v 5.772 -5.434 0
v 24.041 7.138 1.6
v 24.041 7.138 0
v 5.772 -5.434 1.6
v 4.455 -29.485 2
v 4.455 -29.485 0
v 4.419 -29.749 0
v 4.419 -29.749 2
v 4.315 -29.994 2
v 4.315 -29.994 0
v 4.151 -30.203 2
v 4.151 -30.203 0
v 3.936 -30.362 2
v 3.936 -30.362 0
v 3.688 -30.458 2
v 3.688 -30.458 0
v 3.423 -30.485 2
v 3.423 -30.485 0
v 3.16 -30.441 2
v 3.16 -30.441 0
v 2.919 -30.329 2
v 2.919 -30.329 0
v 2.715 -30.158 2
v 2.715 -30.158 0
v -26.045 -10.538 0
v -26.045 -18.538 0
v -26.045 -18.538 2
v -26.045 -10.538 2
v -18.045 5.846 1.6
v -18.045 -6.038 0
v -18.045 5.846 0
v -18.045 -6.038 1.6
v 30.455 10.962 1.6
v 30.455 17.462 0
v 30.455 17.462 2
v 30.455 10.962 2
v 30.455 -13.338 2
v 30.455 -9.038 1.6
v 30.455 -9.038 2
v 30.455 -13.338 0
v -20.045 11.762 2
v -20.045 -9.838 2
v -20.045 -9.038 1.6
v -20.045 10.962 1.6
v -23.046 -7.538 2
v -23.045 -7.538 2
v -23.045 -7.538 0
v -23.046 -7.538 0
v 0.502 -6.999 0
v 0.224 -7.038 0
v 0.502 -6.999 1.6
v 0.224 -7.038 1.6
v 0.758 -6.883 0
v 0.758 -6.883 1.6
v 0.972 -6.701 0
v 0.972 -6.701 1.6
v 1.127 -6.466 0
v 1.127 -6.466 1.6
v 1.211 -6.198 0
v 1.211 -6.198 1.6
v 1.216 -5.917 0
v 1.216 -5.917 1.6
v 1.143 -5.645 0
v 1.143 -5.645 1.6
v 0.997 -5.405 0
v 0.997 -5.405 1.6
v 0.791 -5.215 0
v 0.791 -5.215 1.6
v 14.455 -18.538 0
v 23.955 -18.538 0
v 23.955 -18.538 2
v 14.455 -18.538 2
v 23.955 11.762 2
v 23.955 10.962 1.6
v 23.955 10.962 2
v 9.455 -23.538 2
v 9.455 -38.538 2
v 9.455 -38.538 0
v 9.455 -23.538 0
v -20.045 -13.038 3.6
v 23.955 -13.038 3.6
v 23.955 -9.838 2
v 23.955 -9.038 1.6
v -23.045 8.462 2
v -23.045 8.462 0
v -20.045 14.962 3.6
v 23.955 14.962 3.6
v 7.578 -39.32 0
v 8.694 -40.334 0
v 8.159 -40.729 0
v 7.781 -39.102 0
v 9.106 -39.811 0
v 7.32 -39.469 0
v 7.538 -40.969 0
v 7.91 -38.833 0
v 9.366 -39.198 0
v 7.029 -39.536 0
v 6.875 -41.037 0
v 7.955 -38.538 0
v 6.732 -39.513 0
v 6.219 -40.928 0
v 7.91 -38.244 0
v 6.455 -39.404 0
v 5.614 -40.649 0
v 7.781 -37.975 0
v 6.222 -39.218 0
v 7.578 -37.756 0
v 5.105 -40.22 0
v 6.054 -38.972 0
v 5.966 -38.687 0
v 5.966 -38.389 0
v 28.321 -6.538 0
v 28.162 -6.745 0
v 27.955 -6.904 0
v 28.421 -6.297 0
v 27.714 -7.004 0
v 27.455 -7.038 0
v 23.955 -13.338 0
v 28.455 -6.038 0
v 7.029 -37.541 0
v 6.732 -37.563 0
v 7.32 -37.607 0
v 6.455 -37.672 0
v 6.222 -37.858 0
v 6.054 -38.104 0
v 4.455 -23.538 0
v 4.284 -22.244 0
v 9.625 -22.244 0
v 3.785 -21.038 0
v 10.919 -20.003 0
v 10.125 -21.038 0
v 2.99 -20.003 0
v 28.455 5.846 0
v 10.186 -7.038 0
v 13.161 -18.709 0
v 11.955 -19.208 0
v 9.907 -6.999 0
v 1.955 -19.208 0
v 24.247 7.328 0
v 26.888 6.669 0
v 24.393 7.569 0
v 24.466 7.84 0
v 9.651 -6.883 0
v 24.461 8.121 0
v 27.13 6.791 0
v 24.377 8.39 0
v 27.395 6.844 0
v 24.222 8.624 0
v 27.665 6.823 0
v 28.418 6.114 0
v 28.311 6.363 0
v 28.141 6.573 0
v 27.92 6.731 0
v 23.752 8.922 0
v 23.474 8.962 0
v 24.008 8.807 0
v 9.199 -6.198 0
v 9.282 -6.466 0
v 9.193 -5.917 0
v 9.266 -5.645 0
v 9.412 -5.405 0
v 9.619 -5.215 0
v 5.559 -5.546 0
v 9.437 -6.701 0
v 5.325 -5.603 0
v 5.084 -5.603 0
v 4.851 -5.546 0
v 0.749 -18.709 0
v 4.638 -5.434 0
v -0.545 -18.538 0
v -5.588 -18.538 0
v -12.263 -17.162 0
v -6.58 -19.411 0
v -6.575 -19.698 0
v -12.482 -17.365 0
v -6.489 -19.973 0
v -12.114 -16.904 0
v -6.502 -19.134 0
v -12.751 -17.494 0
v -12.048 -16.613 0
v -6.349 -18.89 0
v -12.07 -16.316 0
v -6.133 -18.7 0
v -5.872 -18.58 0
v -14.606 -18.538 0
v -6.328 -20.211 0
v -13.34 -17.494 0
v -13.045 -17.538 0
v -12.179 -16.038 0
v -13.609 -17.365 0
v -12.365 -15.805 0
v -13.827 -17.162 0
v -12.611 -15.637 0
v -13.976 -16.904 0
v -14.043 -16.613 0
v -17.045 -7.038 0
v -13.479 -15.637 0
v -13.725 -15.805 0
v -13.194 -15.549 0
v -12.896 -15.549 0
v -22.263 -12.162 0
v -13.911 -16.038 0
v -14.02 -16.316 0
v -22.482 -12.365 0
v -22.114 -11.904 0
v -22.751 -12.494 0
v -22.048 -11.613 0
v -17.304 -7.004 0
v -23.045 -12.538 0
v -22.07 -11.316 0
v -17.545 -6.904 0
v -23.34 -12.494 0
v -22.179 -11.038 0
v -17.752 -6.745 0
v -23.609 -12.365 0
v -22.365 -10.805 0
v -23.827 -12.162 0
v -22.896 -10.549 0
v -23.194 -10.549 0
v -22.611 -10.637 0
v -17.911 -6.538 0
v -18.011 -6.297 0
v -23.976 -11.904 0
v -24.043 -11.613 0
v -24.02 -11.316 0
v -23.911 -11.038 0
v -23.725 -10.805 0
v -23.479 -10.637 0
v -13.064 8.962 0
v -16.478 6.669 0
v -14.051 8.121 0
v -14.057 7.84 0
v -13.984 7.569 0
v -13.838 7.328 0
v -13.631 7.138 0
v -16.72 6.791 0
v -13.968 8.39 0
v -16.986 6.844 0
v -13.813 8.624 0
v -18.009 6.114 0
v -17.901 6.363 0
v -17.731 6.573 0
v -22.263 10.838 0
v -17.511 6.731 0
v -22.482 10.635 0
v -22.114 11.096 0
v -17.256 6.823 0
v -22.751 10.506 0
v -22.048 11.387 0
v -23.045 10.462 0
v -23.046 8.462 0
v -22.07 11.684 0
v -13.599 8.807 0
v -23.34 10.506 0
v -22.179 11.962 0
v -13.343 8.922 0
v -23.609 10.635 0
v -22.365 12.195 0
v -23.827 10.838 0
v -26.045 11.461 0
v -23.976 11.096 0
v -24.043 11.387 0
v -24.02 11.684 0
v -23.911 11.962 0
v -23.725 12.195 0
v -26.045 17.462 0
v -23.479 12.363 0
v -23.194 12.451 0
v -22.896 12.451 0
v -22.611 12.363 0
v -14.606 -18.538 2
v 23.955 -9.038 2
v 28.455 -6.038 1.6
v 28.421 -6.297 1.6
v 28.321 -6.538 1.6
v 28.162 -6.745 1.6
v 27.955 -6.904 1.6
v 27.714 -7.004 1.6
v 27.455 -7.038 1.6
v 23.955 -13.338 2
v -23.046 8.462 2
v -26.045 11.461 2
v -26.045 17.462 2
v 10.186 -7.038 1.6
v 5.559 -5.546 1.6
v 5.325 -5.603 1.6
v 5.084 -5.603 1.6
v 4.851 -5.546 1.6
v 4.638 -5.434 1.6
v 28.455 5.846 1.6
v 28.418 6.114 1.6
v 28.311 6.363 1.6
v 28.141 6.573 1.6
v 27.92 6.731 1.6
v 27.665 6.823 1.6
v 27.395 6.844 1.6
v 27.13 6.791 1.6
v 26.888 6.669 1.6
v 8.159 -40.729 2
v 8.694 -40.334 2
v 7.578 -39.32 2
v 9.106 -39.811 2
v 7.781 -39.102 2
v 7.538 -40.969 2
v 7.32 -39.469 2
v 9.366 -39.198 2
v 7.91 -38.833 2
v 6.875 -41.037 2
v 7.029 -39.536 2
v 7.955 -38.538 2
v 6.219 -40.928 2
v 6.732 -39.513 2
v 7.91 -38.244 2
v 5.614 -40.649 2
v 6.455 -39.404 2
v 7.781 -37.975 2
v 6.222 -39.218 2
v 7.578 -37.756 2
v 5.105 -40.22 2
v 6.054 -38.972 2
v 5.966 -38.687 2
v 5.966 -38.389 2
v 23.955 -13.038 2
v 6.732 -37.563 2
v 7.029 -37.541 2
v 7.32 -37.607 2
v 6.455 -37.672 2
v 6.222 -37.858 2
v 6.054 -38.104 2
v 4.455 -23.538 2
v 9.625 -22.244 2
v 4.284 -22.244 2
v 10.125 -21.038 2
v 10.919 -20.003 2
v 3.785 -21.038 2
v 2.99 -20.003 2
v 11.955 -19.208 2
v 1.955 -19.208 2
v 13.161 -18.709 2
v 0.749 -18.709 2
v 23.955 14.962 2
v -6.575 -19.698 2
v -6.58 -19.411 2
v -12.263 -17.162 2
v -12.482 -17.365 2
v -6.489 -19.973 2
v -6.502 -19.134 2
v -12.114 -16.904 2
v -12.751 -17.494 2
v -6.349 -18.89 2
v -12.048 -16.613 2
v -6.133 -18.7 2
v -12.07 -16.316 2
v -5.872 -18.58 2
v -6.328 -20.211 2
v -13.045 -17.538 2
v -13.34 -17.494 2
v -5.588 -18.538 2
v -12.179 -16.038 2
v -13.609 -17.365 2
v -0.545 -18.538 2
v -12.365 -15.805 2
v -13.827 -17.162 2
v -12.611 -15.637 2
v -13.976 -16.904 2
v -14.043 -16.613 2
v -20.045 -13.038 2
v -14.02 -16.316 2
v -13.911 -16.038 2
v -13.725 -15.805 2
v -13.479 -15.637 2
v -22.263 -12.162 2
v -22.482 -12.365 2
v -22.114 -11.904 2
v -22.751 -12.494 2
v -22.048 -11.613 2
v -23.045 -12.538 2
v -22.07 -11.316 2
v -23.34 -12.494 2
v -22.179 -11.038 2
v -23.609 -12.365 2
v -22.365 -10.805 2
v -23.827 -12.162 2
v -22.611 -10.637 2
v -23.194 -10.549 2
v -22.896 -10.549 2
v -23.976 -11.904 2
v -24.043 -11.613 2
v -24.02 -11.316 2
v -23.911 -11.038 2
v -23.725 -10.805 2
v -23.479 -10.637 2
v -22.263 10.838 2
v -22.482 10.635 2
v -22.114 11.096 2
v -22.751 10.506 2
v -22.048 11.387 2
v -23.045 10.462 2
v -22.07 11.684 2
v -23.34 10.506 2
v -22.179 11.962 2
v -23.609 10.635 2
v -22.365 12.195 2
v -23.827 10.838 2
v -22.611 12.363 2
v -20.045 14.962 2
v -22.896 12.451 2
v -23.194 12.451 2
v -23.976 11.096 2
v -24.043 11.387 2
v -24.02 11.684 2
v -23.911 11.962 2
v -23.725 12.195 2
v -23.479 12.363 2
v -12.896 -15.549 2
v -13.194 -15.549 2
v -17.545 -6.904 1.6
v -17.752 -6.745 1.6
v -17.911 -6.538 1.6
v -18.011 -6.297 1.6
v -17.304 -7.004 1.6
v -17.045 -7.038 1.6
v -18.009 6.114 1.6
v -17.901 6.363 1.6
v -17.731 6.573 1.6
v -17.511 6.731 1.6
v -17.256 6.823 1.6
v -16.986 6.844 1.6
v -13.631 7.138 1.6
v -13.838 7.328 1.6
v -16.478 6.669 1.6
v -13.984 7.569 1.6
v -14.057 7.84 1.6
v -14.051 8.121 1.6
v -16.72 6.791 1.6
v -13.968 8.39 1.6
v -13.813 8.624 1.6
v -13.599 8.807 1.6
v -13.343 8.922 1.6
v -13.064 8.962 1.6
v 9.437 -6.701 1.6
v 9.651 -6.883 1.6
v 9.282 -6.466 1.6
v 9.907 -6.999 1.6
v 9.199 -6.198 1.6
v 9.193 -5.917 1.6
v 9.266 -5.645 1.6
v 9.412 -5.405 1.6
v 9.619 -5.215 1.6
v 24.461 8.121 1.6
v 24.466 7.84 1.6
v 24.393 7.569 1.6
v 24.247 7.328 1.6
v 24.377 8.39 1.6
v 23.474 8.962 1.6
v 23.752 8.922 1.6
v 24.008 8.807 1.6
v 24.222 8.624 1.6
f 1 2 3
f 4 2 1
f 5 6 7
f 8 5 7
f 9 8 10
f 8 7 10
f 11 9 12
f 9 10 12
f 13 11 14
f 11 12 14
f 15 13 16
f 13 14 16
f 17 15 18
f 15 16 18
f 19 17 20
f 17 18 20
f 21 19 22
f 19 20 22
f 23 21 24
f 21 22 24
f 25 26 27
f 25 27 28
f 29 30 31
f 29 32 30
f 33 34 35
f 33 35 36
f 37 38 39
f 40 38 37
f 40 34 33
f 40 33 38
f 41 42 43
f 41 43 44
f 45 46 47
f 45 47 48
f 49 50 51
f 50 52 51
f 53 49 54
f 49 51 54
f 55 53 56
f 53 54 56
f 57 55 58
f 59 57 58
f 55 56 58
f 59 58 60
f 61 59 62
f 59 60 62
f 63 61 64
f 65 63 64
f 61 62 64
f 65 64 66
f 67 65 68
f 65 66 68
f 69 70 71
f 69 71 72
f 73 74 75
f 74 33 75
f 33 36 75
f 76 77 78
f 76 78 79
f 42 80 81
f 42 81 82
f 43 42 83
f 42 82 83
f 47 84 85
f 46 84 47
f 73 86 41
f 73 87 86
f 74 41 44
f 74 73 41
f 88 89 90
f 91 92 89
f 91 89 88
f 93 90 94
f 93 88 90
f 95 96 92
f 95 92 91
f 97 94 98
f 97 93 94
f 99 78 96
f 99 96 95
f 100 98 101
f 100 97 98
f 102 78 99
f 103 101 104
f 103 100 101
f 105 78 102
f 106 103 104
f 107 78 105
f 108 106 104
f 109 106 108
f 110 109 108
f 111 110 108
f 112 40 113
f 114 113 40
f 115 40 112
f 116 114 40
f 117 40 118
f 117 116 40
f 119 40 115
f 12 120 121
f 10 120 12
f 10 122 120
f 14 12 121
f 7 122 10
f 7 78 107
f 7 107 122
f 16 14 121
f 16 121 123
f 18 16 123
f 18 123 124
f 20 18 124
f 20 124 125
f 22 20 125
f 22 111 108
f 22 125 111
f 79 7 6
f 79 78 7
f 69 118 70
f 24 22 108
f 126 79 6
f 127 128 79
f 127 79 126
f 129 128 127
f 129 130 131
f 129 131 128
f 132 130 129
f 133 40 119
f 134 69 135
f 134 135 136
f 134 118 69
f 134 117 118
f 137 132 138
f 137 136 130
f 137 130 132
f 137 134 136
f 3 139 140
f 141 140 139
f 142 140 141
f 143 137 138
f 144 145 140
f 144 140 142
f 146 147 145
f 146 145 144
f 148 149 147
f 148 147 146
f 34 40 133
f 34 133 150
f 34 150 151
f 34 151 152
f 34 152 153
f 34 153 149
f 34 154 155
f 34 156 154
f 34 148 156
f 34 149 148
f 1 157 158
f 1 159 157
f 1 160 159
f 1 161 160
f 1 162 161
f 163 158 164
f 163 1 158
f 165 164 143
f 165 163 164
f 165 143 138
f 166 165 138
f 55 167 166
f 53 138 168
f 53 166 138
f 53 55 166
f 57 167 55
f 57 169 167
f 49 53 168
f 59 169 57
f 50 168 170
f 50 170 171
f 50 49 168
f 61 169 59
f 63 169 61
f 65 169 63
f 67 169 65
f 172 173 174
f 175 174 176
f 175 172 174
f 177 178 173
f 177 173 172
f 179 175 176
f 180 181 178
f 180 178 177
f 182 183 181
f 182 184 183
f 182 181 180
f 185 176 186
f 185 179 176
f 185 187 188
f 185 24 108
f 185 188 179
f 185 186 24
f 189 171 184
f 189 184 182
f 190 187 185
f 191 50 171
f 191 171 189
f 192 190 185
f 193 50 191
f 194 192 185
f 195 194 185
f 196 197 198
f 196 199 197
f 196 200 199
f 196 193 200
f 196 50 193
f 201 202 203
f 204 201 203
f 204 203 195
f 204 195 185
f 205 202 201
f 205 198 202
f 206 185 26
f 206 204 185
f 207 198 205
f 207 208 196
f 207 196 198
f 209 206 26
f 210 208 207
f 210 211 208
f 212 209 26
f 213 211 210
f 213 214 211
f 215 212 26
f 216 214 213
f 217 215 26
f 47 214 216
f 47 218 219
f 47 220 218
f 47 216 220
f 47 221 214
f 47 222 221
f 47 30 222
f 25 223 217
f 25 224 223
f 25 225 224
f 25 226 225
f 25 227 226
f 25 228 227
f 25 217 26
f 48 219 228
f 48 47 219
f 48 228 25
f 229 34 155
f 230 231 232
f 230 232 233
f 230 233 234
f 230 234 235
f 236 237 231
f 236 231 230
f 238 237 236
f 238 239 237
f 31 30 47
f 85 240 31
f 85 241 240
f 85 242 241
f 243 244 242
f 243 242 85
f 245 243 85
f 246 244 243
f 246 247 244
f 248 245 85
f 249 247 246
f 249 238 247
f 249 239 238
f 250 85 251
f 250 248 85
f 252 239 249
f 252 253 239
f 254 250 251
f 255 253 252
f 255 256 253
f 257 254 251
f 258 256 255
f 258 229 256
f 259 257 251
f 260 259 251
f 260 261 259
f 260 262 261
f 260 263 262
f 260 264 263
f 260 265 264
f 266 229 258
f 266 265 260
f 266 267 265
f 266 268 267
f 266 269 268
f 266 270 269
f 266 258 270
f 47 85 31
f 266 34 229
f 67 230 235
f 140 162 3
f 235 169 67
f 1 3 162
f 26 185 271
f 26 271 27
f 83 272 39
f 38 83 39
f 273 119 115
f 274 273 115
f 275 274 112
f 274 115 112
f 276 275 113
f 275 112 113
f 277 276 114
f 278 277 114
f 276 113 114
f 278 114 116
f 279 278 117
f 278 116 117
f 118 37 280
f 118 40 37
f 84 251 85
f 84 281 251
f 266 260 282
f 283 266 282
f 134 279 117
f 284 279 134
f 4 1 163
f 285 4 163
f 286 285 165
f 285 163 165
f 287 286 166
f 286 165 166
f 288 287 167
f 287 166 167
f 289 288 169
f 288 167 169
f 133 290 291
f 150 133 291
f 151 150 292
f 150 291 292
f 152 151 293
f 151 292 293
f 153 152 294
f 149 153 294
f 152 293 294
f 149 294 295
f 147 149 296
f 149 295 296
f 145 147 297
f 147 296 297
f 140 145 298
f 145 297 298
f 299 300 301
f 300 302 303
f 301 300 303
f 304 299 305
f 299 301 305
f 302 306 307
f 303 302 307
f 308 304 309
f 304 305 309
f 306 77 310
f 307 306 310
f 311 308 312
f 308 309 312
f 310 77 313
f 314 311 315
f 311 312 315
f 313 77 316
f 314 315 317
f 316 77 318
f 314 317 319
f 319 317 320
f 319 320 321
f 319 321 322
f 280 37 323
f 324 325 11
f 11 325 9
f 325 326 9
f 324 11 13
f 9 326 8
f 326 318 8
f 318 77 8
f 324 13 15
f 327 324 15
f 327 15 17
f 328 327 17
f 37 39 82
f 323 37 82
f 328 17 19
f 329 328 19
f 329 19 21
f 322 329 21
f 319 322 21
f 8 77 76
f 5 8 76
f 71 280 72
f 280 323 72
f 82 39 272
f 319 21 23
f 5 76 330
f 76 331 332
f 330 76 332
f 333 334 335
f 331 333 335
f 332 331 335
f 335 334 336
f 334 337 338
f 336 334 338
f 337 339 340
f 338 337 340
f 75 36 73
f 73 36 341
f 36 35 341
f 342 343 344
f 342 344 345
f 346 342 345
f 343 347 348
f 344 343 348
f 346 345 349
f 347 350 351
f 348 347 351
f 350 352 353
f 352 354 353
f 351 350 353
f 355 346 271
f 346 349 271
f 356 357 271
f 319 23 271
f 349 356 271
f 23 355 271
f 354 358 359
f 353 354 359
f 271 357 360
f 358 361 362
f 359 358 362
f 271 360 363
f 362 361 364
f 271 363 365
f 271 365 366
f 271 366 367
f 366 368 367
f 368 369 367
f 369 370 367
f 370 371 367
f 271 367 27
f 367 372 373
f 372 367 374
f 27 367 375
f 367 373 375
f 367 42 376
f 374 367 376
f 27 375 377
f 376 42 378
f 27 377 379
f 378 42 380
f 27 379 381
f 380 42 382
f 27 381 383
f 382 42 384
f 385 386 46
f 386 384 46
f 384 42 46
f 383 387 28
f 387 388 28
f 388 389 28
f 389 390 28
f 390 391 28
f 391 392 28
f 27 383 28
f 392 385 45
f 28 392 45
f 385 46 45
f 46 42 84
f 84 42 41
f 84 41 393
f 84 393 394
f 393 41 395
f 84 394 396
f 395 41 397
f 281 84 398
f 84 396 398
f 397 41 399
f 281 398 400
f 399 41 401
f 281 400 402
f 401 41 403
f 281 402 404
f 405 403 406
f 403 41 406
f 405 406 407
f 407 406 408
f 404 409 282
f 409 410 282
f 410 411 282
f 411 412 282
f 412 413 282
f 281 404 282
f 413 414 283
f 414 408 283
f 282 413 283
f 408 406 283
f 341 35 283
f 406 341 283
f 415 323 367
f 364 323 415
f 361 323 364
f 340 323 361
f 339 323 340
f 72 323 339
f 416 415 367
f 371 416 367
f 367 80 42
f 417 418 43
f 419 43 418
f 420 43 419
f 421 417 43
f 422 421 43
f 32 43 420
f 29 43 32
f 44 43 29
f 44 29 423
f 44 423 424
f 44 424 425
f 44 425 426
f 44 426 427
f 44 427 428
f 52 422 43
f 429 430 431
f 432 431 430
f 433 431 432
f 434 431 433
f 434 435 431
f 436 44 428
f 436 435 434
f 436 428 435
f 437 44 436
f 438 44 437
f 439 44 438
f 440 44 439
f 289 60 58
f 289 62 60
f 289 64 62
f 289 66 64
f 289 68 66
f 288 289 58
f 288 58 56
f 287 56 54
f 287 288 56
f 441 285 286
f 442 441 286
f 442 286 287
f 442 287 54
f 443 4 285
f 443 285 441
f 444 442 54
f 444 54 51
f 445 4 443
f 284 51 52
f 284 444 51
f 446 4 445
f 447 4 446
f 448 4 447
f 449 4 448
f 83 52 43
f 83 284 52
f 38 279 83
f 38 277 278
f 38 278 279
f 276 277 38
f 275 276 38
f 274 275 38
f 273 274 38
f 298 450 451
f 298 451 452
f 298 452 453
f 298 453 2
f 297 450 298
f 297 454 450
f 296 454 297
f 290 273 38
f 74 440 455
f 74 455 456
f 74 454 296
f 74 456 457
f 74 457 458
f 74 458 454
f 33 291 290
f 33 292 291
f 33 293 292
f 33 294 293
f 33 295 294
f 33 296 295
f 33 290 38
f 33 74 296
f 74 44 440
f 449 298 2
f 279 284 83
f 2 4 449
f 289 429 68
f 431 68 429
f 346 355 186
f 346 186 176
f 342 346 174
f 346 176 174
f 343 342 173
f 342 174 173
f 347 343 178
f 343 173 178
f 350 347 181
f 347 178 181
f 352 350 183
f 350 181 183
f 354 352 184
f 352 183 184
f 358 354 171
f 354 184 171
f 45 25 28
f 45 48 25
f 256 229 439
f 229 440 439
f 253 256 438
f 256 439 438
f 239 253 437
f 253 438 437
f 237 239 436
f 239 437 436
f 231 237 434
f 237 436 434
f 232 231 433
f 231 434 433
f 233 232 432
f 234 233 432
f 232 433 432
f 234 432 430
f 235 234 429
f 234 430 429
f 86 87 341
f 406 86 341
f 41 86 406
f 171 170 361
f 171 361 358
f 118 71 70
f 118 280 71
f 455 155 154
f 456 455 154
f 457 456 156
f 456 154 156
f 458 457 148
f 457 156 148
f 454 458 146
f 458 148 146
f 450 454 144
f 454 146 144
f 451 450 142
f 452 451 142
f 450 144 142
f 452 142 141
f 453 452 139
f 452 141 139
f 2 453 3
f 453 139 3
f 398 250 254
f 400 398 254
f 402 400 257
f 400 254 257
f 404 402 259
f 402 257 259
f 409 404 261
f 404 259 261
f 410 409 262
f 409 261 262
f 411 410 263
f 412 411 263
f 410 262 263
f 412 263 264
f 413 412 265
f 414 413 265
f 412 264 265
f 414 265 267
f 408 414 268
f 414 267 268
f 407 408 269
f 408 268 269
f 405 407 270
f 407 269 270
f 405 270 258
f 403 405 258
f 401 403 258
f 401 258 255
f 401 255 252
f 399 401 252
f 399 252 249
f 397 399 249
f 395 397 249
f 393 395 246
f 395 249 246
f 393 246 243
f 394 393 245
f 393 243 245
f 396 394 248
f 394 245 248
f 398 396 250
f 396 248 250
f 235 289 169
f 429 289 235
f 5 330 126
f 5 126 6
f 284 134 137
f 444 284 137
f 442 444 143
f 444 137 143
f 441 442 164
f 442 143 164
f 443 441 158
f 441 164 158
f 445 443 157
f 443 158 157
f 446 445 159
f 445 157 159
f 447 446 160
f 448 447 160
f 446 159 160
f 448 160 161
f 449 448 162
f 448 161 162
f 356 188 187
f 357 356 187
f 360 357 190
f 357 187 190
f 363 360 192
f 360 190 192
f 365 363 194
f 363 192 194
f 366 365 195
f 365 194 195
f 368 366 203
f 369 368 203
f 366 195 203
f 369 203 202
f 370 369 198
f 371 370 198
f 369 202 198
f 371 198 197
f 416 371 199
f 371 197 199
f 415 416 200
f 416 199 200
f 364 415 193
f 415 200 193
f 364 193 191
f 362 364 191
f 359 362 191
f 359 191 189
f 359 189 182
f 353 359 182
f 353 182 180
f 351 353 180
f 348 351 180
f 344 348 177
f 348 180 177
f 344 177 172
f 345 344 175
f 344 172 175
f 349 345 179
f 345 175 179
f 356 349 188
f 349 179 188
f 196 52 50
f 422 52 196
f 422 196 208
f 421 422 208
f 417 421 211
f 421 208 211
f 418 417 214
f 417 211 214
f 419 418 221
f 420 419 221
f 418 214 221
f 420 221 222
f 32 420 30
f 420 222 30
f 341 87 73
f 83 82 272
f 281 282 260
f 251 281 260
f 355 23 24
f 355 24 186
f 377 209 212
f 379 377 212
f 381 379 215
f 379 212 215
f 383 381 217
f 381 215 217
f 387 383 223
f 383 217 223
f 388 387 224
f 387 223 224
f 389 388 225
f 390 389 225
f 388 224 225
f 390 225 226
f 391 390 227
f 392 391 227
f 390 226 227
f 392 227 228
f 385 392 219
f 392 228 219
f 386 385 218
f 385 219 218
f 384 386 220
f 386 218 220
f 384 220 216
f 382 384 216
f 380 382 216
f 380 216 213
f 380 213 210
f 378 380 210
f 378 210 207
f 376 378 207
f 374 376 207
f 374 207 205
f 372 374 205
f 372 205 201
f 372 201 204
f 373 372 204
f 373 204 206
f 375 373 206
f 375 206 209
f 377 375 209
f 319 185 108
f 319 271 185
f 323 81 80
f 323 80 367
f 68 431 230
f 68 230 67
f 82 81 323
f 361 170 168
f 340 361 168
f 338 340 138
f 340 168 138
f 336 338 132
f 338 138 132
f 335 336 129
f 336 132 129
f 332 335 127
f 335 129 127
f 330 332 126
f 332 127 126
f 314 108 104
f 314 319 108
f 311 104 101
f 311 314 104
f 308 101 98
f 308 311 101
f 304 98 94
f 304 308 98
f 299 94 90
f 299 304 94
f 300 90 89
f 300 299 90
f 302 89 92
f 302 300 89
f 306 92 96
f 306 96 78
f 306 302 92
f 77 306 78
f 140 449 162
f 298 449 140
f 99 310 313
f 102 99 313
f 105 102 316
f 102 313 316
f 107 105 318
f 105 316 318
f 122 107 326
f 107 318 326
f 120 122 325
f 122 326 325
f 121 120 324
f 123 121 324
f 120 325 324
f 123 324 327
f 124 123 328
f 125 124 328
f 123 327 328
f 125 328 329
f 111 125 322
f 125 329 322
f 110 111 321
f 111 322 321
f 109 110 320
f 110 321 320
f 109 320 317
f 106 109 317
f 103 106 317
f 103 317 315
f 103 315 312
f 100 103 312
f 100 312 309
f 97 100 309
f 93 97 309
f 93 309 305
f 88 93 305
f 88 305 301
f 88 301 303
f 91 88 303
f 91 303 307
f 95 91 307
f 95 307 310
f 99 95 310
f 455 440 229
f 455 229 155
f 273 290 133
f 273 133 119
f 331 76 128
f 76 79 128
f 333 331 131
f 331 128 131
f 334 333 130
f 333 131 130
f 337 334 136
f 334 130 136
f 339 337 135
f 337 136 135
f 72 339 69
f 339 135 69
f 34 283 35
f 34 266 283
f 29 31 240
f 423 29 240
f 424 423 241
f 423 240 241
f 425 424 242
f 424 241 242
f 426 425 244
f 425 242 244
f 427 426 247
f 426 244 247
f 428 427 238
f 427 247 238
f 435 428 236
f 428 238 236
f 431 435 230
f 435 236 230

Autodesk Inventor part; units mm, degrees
ref_plane "YZ Plane" through (0, 0, 0) normal (1, 0, 0) x (0, 1, 0)
ref_plane "XZ Plane" through (0, 0, 0) normal (0, 1, 0) x (-1, 0, 0)
ref_plane "XY Plane" through (0, 0, 0) normal (0, 0, 1) x (1, 0, 0)
sketch "Sketch1" plane through (0, 0, 0) normal (0, 0, 1) x (1, 0, 0)
  line L0 (-26.0453, 15.4617) -> (23.9547, 15.4617)
  line L1 (23.9547, 15.4617) -> (23.9547, -18.5383)
  line L2 (23.9547, -18.5383) -> (-26.0453, -18.5383)
  line L3 (-26.0453, -18.5383) -> (-26.0453, 15.4617)
  point P0 (0, 0)
  dimension "d0" = 50
  dimension "d1" = 34
extrude "Extrusion1" add sketch "Sketch1" along normal blind 2
sketch "Sketch2" plane through (0, 0, 2) normal (0, 0, 1) x (1, 0, 0)
  line L0 (-26.0453, 15.4617) -> (-26.0453, -18.5383) projected
  line L1 (23.9547, 15.4617) -> (-26.0453, 15.4617) projected
  point P0 (0, 0)
  point P1 (-23.0453, 11.4617)
  point P2 (-23.0453, -11.5383)
  point P3 (-13.0453, -16.5383)
  dimension "d4" = 23
  dimension "d5" = 3
  dimension "d6" = 3
  dimension "d7" = 4
  dimension "d8" = 5
  dimension "d9" = 10
hole "Hole1" at (-23.0453, 11.4617, 2) at (-23.0453, -11.5383, 2) at (-13.0453, -16.5383, 2) direction (0, 0, -1) diameter 2 depth 6.5 tip angle 118
sketch "Sketch3" plane through (0, 0, 2) normal (0, 0, 1) x (1, 0, 0)
  line L0 (-26.0453, 15.4617) -> (-26.0453, -18.5383) projected
  line L1 (-26.0453, 8.4617) -> (-23.0453, 8.4617)
  line L2 (-23.0453, 8.4617) -> (-23.0453, -7.5383)
  line L3 (-23.0453, -7.5383) -> (-26.0453, -7.5383)
  line L4 (-26.0453, -7.5383) -> (-26.0453, 8.4617)
  line L5 (23.9547, 15.4617) -> (-26.0453, 15.4617) projected
  circle A0 centre (-23.0453, -11.5383) radius 1 projected
  point P0 (0, 0)
  dimension "d17" = 7
  dimension "d18" = 4
  dimension "d19" = 3
extrude "Extrusion2" cut sketch "Sketch3" against normal blind 2 contours L1 L2 L3 L0
chamfer "Chamfer1" distance 3 angle 45 2 edges at (-26.0453, 8.4617, 1) (-26.0453, -7.5383, 1)
sketch "Sketch5" plane through (0, 0, 2) normal (0, 0, 1) x (1, 0, 0)
  line L0 (-20.0453, 14.9617) -> (23.9547, 14.9617)
  line L1 (23.9547, 14.9617) -> (23.9547, -13.0383)
  line L2 (23.9547, -13.0383) -> (-20.0453, -13.0383)
  line L3 (-20.0453, -13.0383) -> (-20.0453, 14.9617)
  line L4 (23.9547, 15.4617) -> (-26.0453, 15.4617) projected
  line L5 (-26.0453, -18.5383) -> (23.9547, -18.5383) projected
  line L6 (-23.0453, 8.4617) -> (-23.0453, -7.5383) projected
  line L7 (23.9547, -18.5383) -> (23.9547, 15.4617) projected
  circle A0 centre (-13.0453, -16.5383) radius 1 projected
  point P0 (0, 0)
  dimension "d27" = 3
  dimension "d28" = 0
  dimension "d29" = 50
  dimension "d30" = 3.5
  dimension "d31" = 31.5
  dimension "d32" = 0.5
extrude "Extrusion3" cut sketch "Sketch5" against normal blind 0.4 contours L0 L1 L2 L3
sketch "Sketch8" plane through (0, 0, 2) normal (0, 0, 1) x (1, 0, 0)
  line L0 (-26.0453, -18.5383) -> (23.9547, -18.5383) projected
  line L1 (11.9547, -18.5383) -> (-1.0453, -18.5383)
  line L2 (-1.0453, -18.5383) -> (-1.0453, -44.5383)
  line L3 (-1.0453, -44.5383) -> (11.9547, -44.5383)
  line L4 (11.9547, -44.5383) -> (11.9547, -18.5383)
  line L5 (23.9547, -18.5383) -> (23.9547, 15.4617) projected
  circle A0 centre (-13.0453, -16.5383) radius 1 projected
  line L6 (6.9547, -38.5383) -> (6.9547, -18.5383) construction
  line L7 (9.4547, -38.5383) -> (9.4547, -18.5383)
  line L8 (4.4547, -18.5383) -> (4.4547, -38.5383)
  arc A1 (4.4547, -38.5383) -> (9.4547, -38.5383) centre (6.9547, -38.5383) ccw
  arc A2 (9.4547, -18.5383) -> (4.4547, -18.5383) centre (6.9547, -18.5383) ccw
  circle A3 centre (6.9547, -38.5383) radius 1
  point P0 (0, 0)
  point P1 (23.9547, -13.0383)
  point P2 (6.9547, -28.5383)
  dimension "d48" = 12
  dimension "d49" = 25
  dimension "d50" = 20
  dimension "d51" = 22
  dimension "d52" = 6
  dimension "d53" = 5
  dimension "d54" = 2
extrude "Extrusion6" add sketch "Sketch8" against normal blind 2 contours L0 L7 A1 L8
fillet "Fillet1" radius 5 2 edges at (4.4547, -18.5383, 1) (9.4547, -18.5383, 1)
sketch "Sketch9" plane through (0, 0, 2) normal (0, 0, 1) x (1, 0, 0)
  circle A0 centre (-13.0453, -16.5383) radius 1 projected
  circle A1 centre (6.9547, -38.5383) radius 1 projected
  line L0 (-13.0453, -16.5383) -> (6.9547, -38.5383) construction
  line L1 (-14.8951, -18.22) -> (5.1049, -40.22)
  line L2 (8.8046, -36.8566) -> (-11.1954, -14.8566)
  arc A2 (-11.1954, -14.8566) -> (-14.8951, -18.22) centre (-13.0453, -16.5383) ccw
  arc A3 (5.1049, -40.22) -> (8.8046, -36.8566) centre (6.9547, -38.5383) ccw
  line L3 (-26.0453, -18.5383) -> (-0.5453, -18.5383) projected
  line L4 (-14.6058, -18.5383) -> (-7.8485, -18.5383)
  line L5 (4.4547, -23.5383) -> (4.4547, -38.5383) projected
  line L6 (4.4547, -32.0718) -> (4.4547, -38.5383)
  line L7 (4.4547, -38.5383) -> (6.7171, -41.027)
  arc A4 (4.4547, -38.5383) -> (9.4547, -38.5383) centre (6.9547, -38.5383) ccw projected
  point P0 (0, 0)
  point P1 (-3.0453, -27.5383)
extrude "Extrusion7" add sketch "Sketch9" against normal blind 2 contours L3 L2 L5 A4 L1
fillet "Fillet2" radius 1 2 edges at (-7.8485, -18.5383, 1) (4.4547, -32.0718, 1)
sketch "Sketch10" plane through (-26.0453, 15.4617, 0) normal (0, 1, 0) x (1, 0, 0)
  line L0 (50, 0) -> (50, -2) projected
  line L1 (0, 0) -> (0, -2) projected
  line L2 (50, -2) -> (0, -2)
  line L3 (0, -2) -> (0, 0)
  line L4 (0, 0) -> (50, 0)
  line L5 (50, 0) -> (50, -2)
  point P0 (26.0453, 0)
extrude "Extrusion8" add sketch "Sketch10" along normal blind 2
sketch "Sketch13" plane through (23.9547, -18.5383, 2) normal (1, 0, 0) x (0, 0, -1)
  line L0 (0, 0) -> (0, 5.5) projected
  line L1 (0.4, 5.5) -> (0.4, 33.5) projected
  line L2 (0.4, 5.5) -> (0, 5.5) projected
  line L3 (-1.6, 5.5) -> (0.4, 9.5)
  line L4 (0, 5.5) -> (0.4, 5.5) projected
  line L5 (-1.6, 5.5) -> (0.4, 5.5)
  line L6 (0.4, 5.5) -> (0.4, 9.5)
  point P0 (2, 18.5383)
  point P1 (0.4, 30.4)
  dimension "d70" = 1.6
  dimension "d71" = 4
extrude "Extrusion11" add sketch "Sketch13" against normal blind 44
sketch "Sketch14" plane through (23.9547, -18.5383, 2) normal (1, 0, 0) x (0, 0, -1)
  line L0 (0, 33.5) -> (0, 36) projected
  line L1 (0.4, 33.5) -> (0.4, 9.5) projected
  line L2 (0, 33.5) -> (0.4, 33.5) projected
  line L3 (-1.6, 33.5) -> (0.4, 29.5)
  line L4 (-1.6, 33.5) -> (0.4, 33.5)
  line L5 (0.4, 29.5) -> (0.4, 33.5)
  point P0 (2, 18.5383)
  dimension "d74" = 1.6
  dimension "d75" = 4
extrude "Extrusion12" add sketch "Sketch14" against normal blind 44
sketch "Sketch15" plane through (0, 0, 0) normal (0, 0, -1) x (-1, 0, 0)
  line L0 (-23.9547, -18.5383) -> (-23.9547, 17.4617) projected
  line L1 (-23.9547, 17.4617) -> (-30.4547, 17.4617)
  line L2 (-30.4547, 17.4617) -> (-30.4547, -13.3383)
  line L3 (-30.4547, -13.3383) -> (-23.9547, -13.3383)
  line L4 (-23.9547, -13.3383) -> (-23.9547, 17.4617)
  line L5 (-14.4547, -18.5383) -> (-23.9547, -18.5383) projected
  point P0 (0, 0)
  dimension "d78" = 5.2
  dimension "d79" = 6.5
extrude "Extrusion13" add sketch "Sketch15" against normal blind 2
sketch "Sketch16" plane through (0, 0, 2) normal (0, 0, 1) x (1, 0, 0)
  line L0 (30.4547, -13.3383) -> (30.4547, 17.4617) projected
  line L1 (-20.0453, -9.0383) -> (23.9547, -9.0383) projected
  line L2 (30.4547, 10.9617) -> (-20.0453, 10.9617)
  line L3 (-20.0453, 10.9617) -> (-20.0453, -9.0383)
  line L4 (-20.0453, -9.0383) -> (30.4547, -9.0383)
  line L5 (30.4547, -9.0383) -> (30.4547, 10.9617)
  line L6 (23.9547, 10.9617) -> (-20.0453, 10.9617) projected
  point P0 (0, 0)
  point P1 (30.4547, -9.0383)
extrude "Extrusion14" cut sketch "Sketch16" against normal blind 0.4
sketch "Sketch17" plane through (0, 0, 1.6) normal (0, 0, 1) x (1, 0, 0)
  line L0 (28.4547, -7.0383) -> (-18.0453, -7.0383)
  line L1 (-18.0453, -7.0383) -> (-18.0453, 8.9617)
  line L2 (-18.0453, 8.9617) -> (28.4547, 8.9617)
  line L3 (28.4547, 8.9617) -> (28.4547, -7.0383)
  line L4 (30.4547, -9.0383) -> (23.9547, -9.0383) projected
  line L5 (23.9547, 10.9617) -> (30.4547, 10.9617) projected
  line L6 (30.4547, 10.9617) -> (30.4547, -9.0383) projected
  line L7 (-20.0453, -9.8383) -> (-20.0453, 11.7617) projected
  point P0 (0, 0)
  dimension "d84" = 2
  dimension "d85" = 2
  dimension "d86" = 2
  dimension "d87" = 2
extrude "Extrusion15" cut sketch "Sketch17" against normal blind 2
sketch "Sketch18" plane through (0, 0, 1.6) normal (0, 0, 1) x (1, 0, 0)
  line L0 (-18.0453, -7.0383) -> (28.4547, -7.0383) projected
  line L1 (28.4547, 8.9617) -> (-18.0453, 8.9617) projected
  line L2 (5.2047, -7.0383) -> (28.4547, 8.9617) construction
  line L3 (5.7716, -7.8621) -> (29.0216, 8.1379)
  line L4 (27.8878, 9.7855) -> (4.6378, -6.2145)
  arc A0 (4.6378, -6.2145) -> (5.7716, -7.8621) centre (5.2047, -7.0383) ccw
  arc A1 (29.0216, 8.1379) -> (27.8878, 9.7855) centre (28.4547, 8.9617) ccw
  line L5 (5.2047, -7.0383) -> (-18.0453, 8.9617) construction
  line L6 (5.7716, -6.2145) -> (-17.4784, 9.7855)
  line L7 (-18.6122, 8.1379) -> (4.6378, -7.8621)
  arc A2 (4.6378, -7.8621) -> (5.7716, -6.2145) centre (5.2047, -7.0383) ccw
  arc A3 (-17.4784, 9.7855) -> (-18.6122, 8.1379) centre (-18.0453, 8.9617) ccw
  point P0 (0, 0)
  point P1 (16.5637, 8.9617)
  point P2 (-8.738, 9.9617)
  point P3 (16.8297, 0.9617)
  point P4 (-6.4203, 0.9617)
  point P5 (4.6378, -7.8621)
  point P6 (5.2047, -5.8244)
  dimension "d90" = 46.5
  dimension "d91" = 2
  dimension "d92" = 2
extrude "Extrusion16" add sketch "Sketch18" against normal blind 1.6 contours L7 A3 L6 L4 A0 L0 | L0 A0 L7 | A0 L4 L6 A2 L0 | L0 A2 A0 | A2 L6 L4 A1 L3 L0 | L0 L3 A2
fillet "Fillet3" radius 1 9 edges at (28.4547, -7.0383, 0.8) (28.4547, 7.7478, 0.8) (26.6907, 8.9617, 0.8) (6.9687, -7.0383, 0.8) (5.2047, -5.8244, 0.8) (3.4407, -7.0383, 0.8) (-16.2813, 8.9617, 0.8) (-18.0453, 7.7478, 0.8) (-18.0453, -7.0383, 0.8)
